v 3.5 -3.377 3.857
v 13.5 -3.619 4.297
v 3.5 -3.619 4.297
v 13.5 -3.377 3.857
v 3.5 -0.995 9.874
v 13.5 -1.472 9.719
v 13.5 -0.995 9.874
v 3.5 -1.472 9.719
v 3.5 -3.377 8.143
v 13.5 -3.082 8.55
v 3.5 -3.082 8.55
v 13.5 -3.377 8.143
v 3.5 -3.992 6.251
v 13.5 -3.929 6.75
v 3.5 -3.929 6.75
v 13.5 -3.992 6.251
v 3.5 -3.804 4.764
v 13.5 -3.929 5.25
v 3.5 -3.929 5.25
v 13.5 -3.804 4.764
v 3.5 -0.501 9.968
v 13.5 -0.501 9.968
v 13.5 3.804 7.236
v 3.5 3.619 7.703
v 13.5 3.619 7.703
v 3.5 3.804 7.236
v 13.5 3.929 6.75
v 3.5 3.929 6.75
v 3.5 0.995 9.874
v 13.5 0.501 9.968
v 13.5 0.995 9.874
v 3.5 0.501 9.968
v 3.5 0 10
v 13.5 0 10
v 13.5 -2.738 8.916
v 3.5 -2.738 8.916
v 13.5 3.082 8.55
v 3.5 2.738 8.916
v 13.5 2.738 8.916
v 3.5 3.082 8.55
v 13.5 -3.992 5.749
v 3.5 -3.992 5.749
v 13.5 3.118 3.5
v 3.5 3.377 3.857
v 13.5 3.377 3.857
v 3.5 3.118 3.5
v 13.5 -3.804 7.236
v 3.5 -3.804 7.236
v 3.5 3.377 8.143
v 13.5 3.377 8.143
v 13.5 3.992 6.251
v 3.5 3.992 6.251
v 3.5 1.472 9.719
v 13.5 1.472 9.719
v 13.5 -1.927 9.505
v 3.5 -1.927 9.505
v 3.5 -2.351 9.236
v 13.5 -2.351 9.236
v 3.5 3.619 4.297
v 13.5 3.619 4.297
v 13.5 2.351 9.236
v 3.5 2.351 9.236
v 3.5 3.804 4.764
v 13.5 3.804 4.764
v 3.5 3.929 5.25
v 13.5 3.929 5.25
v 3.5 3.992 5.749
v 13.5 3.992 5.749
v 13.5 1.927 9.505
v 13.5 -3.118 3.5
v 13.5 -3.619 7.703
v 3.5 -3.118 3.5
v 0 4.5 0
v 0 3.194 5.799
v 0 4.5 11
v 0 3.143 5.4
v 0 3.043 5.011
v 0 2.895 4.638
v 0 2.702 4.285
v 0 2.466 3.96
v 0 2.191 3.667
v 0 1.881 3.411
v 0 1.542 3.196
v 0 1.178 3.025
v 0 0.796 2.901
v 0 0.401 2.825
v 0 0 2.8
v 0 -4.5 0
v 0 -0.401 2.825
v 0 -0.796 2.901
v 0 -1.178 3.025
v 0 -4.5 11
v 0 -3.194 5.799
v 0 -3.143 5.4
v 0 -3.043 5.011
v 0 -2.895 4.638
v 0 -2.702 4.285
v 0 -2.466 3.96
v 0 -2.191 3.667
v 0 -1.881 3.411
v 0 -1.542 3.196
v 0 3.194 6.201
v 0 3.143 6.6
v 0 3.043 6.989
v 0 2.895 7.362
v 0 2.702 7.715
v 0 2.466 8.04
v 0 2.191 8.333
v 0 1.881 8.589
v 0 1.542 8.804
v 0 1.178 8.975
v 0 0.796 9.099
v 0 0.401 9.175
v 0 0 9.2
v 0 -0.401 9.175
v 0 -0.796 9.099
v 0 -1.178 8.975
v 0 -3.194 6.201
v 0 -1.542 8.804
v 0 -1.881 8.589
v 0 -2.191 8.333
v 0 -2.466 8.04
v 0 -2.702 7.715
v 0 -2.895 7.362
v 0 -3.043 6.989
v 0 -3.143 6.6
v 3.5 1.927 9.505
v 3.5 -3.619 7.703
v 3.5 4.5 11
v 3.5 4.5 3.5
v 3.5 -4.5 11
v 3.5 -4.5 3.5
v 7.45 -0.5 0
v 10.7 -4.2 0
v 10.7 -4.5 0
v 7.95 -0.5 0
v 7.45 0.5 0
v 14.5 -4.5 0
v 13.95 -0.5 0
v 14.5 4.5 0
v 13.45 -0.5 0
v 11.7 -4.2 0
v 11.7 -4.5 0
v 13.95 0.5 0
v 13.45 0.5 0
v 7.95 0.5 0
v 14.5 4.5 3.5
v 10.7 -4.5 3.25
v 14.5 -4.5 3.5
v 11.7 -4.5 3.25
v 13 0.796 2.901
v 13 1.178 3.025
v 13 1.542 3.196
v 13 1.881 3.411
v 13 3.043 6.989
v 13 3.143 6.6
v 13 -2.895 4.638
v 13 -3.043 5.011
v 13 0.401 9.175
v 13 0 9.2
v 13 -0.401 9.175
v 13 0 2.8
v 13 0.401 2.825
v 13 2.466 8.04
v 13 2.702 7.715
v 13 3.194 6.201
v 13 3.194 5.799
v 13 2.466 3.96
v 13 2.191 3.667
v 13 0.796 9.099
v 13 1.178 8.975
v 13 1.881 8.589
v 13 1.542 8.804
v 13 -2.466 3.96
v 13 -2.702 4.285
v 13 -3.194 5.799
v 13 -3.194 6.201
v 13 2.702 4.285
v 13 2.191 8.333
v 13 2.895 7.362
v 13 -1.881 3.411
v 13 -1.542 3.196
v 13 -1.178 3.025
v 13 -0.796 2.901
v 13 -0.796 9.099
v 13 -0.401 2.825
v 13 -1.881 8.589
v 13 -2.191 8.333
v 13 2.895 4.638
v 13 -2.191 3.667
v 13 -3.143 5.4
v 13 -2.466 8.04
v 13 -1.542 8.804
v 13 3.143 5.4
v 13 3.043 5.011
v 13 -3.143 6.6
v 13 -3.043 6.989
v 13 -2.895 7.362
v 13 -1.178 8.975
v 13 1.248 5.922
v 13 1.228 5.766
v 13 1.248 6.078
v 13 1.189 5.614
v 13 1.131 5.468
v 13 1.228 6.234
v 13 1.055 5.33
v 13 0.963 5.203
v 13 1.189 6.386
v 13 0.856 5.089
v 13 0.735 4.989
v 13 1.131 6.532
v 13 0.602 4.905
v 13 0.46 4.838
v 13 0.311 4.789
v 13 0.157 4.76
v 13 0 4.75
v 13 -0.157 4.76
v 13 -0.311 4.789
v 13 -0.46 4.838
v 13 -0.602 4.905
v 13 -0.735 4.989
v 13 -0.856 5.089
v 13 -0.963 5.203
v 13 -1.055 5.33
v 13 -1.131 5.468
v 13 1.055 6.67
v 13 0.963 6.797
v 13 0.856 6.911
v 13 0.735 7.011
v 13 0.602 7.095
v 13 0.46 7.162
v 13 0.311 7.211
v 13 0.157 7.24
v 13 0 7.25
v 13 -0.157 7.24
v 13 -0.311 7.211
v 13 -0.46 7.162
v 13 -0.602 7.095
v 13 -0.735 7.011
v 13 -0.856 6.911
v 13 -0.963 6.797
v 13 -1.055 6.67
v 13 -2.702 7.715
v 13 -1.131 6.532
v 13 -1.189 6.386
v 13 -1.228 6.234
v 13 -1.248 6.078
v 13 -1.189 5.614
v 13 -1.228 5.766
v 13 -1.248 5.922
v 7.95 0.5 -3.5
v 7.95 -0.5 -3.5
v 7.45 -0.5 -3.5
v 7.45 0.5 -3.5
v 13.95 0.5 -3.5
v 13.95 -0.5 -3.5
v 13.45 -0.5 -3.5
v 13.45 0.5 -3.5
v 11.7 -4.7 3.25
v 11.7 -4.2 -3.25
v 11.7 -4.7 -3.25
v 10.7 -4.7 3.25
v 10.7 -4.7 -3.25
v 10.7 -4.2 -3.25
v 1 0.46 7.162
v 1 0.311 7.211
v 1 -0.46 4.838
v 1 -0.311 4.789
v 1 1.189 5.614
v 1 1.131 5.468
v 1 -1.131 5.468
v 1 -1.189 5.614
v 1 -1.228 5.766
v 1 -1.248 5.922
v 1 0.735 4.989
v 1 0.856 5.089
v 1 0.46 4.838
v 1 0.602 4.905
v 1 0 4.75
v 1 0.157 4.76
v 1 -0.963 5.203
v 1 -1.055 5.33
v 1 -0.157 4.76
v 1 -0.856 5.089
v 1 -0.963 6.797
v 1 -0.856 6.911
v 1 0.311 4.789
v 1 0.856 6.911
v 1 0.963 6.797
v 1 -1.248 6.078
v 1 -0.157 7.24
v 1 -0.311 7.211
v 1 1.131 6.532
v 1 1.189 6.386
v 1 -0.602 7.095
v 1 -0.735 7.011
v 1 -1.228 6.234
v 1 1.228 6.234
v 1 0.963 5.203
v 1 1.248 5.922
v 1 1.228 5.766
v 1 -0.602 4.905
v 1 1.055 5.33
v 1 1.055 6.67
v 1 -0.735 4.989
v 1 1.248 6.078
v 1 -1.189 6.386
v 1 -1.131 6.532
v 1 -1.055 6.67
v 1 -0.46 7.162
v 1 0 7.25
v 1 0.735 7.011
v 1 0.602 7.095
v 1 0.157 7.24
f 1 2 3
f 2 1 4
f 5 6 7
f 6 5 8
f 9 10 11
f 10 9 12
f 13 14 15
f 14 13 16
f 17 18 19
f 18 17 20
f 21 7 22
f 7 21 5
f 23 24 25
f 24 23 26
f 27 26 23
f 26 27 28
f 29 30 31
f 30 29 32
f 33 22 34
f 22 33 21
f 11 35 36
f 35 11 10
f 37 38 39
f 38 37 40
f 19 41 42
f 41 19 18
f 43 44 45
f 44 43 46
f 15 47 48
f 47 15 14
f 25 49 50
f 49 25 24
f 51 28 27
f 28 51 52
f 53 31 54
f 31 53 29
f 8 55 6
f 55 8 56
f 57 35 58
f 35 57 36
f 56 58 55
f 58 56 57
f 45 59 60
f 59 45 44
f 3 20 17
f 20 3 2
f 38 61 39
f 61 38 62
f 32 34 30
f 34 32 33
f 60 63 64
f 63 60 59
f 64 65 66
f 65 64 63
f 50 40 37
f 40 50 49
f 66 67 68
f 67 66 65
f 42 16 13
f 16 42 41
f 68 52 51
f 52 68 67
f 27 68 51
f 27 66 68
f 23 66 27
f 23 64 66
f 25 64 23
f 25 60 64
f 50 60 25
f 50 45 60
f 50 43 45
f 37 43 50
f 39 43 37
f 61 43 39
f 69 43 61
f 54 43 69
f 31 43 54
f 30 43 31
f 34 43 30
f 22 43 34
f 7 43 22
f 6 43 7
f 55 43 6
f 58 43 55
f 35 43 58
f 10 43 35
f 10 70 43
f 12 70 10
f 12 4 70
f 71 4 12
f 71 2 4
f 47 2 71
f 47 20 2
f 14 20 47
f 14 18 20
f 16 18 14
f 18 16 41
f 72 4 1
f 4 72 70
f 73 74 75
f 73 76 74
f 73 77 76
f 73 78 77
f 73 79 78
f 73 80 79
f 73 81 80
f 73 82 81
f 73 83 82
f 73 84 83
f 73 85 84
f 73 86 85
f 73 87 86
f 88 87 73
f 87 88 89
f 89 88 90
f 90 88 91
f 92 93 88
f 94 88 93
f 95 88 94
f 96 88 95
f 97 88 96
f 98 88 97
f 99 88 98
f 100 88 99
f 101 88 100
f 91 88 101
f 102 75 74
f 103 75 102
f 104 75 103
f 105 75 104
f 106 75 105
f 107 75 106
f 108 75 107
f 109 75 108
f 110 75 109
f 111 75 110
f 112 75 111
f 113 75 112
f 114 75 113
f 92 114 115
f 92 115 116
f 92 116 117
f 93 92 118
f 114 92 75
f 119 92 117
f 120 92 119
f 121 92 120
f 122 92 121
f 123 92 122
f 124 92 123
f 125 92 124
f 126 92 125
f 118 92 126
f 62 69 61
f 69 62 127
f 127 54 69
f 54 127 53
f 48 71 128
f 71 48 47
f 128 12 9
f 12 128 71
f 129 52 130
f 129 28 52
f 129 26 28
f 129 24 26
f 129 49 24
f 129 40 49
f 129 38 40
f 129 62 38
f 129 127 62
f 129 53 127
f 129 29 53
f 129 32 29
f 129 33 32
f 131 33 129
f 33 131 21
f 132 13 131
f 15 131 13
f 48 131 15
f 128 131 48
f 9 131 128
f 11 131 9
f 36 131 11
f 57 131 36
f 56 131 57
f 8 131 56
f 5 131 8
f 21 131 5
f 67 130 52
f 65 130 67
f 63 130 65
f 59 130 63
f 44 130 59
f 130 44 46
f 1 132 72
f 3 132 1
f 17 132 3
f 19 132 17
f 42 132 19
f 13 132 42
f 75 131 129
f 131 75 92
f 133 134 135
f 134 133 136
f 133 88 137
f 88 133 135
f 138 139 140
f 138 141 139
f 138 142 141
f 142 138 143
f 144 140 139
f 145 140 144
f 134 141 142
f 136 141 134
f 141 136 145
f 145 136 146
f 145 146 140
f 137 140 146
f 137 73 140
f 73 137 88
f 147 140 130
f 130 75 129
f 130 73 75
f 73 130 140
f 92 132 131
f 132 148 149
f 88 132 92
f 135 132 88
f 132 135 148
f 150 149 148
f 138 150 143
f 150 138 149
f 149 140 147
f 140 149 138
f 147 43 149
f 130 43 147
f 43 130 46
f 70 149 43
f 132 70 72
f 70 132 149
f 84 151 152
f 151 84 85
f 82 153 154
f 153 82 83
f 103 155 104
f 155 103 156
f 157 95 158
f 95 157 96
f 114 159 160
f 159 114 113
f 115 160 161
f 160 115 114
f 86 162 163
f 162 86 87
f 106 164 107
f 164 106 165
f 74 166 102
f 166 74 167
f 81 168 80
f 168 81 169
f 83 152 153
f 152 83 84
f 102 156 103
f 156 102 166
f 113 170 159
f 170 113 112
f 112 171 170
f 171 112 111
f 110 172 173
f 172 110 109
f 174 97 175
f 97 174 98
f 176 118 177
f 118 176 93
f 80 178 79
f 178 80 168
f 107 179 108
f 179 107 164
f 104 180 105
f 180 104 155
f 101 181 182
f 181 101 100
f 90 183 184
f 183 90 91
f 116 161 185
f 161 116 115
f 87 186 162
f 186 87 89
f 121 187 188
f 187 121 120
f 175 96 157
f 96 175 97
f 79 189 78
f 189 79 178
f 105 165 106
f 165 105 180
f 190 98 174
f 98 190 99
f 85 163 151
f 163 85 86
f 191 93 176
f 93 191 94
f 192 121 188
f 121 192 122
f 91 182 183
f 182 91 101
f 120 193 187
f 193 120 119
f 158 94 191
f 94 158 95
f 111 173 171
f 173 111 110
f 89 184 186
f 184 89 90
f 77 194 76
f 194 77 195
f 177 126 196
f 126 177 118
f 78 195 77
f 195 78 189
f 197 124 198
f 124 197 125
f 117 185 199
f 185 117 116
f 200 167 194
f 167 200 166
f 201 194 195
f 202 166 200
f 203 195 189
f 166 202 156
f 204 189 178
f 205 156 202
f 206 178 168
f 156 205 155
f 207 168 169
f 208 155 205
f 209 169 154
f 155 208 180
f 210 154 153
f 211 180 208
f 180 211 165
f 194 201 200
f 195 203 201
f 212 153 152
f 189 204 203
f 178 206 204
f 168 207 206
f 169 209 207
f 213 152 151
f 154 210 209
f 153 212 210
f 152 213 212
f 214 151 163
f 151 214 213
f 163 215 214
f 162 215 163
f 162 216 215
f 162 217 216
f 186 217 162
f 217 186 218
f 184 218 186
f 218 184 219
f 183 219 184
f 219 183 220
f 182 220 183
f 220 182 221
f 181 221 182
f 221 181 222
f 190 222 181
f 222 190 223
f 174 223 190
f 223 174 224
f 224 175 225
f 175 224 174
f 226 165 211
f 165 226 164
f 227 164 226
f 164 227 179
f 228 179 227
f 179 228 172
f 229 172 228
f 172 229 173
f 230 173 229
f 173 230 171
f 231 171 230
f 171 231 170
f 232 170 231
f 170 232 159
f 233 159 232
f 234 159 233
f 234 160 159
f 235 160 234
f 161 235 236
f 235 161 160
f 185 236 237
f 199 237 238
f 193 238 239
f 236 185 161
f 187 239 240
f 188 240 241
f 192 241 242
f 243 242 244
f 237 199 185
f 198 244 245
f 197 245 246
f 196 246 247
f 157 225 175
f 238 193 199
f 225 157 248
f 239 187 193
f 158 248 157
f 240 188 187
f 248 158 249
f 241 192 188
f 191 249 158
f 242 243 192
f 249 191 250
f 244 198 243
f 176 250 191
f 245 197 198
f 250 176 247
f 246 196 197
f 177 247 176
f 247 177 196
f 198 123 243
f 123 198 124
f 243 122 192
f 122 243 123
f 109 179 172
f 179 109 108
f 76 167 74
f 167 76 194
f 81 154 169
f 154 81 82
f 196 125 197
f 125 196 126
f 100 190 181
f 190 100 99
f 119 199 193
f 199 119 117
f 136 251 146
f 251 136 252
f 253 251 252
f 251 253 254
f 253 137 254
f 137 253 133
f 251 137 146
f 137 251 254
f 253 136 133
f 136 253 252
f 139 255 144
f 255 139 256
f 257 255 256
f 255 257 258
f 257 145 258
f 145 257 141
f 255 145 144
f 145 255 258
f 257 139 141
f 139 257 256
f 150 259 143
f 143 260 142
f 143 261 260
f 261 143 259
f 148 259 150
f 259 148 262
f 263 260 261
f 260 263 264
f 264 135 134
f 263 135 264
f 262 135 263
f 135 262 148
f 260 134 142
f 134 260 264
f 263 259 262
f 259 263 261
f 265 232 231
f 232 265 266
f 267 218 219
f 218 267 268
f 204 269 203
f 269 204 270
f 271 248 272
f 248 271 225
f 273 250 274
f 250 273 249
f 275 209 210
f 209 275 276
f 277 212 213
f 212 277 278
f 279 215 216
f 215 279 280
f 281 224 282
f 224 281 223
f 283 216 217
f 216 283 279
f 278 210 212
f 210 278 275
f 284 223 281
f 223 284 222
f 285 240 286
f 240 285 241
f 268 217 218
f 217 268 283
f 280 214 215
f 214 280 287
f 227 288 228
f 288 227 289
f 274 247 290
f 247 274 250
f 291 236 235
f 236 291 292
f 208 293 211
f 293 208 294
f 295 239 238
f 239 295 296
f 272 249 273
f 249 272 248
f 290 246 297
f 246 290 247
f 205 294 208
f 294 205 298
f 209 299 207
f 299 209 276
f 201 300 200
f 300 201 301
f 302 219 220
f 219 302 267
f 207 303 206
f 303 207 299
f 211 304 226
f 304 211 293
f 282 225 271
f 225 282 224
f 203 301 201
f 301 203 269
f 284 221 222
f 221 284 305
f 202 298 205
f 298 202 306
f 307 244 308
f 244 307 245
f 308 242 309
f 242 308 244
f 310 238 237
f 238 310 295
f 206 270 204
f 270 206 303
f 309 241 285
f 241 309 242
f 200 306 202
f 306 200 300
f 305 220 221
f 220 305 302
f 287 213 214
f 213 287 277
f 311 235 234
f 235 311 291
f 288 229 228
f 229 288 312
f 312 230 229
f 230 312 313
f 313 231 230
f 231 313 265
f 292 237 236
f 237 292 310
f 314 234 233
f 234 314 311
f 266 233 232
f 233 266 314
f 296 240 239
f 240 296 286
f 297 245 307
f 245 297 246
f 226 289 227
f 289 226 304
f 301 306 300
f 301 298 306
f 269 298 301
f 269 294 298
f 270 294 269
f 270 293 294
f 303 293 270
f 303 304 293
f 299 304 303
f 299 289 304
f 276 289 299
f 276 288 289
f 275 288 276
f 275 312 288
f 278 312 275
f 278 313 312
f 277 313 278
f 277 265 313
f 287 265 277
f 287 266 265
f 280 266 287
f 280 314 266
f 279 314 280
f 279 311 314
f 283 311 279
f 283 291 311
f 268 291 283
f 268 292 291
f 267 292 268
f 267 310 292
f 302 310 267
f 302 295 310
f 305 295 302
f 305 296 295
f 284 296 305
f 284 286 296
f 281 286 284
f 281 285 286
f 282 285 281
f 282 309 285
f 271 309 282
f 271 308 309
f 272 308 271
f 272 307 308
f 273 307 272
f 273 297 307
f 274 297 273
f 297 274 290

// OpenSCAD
$fn=50;

color("#404040") difference() {
    union() {
        translate([0, 0, 6]) rotate([0,90,0]) cylinder(d=8, h=13.5);
        translate([0, -4.5, 0]) cube([3.5, 9, 11]);
        translate([0, -4.5, 0]) cube([14.5, 9, 3.5]);
    }
    translate([-1, 0, 6]) rotate([0,90,0]) cylinder(d=6.4, h=14);
}

color("gray") translate([1, 0, 6]) rotate([0,90,0]) cylinder(d=2.5, h=12);

color("gray") {
//    translate([7.7, 0, -3.5]) cylinder(d=1, h=3.5);
//    translate([7.7 + 6, 0, -3.5]) cylinder(d=1, h=3.5);
//    translate([7.7 + 3, -4.7, -3.5]) cylinder(d=1, h=6.5);

    translate([7.7, 0, -3.5/2]) cube([0.5, 1, 3.5], center=true);
    translate([7.7 + 6, 0, -3.5/2]) cube([0.5, 1, 3.5], center=true);
    translate([7.7 + 3, -4.7, -6.5/2]) cube([1, 0.5, 6.5]);
    
    
    
}
